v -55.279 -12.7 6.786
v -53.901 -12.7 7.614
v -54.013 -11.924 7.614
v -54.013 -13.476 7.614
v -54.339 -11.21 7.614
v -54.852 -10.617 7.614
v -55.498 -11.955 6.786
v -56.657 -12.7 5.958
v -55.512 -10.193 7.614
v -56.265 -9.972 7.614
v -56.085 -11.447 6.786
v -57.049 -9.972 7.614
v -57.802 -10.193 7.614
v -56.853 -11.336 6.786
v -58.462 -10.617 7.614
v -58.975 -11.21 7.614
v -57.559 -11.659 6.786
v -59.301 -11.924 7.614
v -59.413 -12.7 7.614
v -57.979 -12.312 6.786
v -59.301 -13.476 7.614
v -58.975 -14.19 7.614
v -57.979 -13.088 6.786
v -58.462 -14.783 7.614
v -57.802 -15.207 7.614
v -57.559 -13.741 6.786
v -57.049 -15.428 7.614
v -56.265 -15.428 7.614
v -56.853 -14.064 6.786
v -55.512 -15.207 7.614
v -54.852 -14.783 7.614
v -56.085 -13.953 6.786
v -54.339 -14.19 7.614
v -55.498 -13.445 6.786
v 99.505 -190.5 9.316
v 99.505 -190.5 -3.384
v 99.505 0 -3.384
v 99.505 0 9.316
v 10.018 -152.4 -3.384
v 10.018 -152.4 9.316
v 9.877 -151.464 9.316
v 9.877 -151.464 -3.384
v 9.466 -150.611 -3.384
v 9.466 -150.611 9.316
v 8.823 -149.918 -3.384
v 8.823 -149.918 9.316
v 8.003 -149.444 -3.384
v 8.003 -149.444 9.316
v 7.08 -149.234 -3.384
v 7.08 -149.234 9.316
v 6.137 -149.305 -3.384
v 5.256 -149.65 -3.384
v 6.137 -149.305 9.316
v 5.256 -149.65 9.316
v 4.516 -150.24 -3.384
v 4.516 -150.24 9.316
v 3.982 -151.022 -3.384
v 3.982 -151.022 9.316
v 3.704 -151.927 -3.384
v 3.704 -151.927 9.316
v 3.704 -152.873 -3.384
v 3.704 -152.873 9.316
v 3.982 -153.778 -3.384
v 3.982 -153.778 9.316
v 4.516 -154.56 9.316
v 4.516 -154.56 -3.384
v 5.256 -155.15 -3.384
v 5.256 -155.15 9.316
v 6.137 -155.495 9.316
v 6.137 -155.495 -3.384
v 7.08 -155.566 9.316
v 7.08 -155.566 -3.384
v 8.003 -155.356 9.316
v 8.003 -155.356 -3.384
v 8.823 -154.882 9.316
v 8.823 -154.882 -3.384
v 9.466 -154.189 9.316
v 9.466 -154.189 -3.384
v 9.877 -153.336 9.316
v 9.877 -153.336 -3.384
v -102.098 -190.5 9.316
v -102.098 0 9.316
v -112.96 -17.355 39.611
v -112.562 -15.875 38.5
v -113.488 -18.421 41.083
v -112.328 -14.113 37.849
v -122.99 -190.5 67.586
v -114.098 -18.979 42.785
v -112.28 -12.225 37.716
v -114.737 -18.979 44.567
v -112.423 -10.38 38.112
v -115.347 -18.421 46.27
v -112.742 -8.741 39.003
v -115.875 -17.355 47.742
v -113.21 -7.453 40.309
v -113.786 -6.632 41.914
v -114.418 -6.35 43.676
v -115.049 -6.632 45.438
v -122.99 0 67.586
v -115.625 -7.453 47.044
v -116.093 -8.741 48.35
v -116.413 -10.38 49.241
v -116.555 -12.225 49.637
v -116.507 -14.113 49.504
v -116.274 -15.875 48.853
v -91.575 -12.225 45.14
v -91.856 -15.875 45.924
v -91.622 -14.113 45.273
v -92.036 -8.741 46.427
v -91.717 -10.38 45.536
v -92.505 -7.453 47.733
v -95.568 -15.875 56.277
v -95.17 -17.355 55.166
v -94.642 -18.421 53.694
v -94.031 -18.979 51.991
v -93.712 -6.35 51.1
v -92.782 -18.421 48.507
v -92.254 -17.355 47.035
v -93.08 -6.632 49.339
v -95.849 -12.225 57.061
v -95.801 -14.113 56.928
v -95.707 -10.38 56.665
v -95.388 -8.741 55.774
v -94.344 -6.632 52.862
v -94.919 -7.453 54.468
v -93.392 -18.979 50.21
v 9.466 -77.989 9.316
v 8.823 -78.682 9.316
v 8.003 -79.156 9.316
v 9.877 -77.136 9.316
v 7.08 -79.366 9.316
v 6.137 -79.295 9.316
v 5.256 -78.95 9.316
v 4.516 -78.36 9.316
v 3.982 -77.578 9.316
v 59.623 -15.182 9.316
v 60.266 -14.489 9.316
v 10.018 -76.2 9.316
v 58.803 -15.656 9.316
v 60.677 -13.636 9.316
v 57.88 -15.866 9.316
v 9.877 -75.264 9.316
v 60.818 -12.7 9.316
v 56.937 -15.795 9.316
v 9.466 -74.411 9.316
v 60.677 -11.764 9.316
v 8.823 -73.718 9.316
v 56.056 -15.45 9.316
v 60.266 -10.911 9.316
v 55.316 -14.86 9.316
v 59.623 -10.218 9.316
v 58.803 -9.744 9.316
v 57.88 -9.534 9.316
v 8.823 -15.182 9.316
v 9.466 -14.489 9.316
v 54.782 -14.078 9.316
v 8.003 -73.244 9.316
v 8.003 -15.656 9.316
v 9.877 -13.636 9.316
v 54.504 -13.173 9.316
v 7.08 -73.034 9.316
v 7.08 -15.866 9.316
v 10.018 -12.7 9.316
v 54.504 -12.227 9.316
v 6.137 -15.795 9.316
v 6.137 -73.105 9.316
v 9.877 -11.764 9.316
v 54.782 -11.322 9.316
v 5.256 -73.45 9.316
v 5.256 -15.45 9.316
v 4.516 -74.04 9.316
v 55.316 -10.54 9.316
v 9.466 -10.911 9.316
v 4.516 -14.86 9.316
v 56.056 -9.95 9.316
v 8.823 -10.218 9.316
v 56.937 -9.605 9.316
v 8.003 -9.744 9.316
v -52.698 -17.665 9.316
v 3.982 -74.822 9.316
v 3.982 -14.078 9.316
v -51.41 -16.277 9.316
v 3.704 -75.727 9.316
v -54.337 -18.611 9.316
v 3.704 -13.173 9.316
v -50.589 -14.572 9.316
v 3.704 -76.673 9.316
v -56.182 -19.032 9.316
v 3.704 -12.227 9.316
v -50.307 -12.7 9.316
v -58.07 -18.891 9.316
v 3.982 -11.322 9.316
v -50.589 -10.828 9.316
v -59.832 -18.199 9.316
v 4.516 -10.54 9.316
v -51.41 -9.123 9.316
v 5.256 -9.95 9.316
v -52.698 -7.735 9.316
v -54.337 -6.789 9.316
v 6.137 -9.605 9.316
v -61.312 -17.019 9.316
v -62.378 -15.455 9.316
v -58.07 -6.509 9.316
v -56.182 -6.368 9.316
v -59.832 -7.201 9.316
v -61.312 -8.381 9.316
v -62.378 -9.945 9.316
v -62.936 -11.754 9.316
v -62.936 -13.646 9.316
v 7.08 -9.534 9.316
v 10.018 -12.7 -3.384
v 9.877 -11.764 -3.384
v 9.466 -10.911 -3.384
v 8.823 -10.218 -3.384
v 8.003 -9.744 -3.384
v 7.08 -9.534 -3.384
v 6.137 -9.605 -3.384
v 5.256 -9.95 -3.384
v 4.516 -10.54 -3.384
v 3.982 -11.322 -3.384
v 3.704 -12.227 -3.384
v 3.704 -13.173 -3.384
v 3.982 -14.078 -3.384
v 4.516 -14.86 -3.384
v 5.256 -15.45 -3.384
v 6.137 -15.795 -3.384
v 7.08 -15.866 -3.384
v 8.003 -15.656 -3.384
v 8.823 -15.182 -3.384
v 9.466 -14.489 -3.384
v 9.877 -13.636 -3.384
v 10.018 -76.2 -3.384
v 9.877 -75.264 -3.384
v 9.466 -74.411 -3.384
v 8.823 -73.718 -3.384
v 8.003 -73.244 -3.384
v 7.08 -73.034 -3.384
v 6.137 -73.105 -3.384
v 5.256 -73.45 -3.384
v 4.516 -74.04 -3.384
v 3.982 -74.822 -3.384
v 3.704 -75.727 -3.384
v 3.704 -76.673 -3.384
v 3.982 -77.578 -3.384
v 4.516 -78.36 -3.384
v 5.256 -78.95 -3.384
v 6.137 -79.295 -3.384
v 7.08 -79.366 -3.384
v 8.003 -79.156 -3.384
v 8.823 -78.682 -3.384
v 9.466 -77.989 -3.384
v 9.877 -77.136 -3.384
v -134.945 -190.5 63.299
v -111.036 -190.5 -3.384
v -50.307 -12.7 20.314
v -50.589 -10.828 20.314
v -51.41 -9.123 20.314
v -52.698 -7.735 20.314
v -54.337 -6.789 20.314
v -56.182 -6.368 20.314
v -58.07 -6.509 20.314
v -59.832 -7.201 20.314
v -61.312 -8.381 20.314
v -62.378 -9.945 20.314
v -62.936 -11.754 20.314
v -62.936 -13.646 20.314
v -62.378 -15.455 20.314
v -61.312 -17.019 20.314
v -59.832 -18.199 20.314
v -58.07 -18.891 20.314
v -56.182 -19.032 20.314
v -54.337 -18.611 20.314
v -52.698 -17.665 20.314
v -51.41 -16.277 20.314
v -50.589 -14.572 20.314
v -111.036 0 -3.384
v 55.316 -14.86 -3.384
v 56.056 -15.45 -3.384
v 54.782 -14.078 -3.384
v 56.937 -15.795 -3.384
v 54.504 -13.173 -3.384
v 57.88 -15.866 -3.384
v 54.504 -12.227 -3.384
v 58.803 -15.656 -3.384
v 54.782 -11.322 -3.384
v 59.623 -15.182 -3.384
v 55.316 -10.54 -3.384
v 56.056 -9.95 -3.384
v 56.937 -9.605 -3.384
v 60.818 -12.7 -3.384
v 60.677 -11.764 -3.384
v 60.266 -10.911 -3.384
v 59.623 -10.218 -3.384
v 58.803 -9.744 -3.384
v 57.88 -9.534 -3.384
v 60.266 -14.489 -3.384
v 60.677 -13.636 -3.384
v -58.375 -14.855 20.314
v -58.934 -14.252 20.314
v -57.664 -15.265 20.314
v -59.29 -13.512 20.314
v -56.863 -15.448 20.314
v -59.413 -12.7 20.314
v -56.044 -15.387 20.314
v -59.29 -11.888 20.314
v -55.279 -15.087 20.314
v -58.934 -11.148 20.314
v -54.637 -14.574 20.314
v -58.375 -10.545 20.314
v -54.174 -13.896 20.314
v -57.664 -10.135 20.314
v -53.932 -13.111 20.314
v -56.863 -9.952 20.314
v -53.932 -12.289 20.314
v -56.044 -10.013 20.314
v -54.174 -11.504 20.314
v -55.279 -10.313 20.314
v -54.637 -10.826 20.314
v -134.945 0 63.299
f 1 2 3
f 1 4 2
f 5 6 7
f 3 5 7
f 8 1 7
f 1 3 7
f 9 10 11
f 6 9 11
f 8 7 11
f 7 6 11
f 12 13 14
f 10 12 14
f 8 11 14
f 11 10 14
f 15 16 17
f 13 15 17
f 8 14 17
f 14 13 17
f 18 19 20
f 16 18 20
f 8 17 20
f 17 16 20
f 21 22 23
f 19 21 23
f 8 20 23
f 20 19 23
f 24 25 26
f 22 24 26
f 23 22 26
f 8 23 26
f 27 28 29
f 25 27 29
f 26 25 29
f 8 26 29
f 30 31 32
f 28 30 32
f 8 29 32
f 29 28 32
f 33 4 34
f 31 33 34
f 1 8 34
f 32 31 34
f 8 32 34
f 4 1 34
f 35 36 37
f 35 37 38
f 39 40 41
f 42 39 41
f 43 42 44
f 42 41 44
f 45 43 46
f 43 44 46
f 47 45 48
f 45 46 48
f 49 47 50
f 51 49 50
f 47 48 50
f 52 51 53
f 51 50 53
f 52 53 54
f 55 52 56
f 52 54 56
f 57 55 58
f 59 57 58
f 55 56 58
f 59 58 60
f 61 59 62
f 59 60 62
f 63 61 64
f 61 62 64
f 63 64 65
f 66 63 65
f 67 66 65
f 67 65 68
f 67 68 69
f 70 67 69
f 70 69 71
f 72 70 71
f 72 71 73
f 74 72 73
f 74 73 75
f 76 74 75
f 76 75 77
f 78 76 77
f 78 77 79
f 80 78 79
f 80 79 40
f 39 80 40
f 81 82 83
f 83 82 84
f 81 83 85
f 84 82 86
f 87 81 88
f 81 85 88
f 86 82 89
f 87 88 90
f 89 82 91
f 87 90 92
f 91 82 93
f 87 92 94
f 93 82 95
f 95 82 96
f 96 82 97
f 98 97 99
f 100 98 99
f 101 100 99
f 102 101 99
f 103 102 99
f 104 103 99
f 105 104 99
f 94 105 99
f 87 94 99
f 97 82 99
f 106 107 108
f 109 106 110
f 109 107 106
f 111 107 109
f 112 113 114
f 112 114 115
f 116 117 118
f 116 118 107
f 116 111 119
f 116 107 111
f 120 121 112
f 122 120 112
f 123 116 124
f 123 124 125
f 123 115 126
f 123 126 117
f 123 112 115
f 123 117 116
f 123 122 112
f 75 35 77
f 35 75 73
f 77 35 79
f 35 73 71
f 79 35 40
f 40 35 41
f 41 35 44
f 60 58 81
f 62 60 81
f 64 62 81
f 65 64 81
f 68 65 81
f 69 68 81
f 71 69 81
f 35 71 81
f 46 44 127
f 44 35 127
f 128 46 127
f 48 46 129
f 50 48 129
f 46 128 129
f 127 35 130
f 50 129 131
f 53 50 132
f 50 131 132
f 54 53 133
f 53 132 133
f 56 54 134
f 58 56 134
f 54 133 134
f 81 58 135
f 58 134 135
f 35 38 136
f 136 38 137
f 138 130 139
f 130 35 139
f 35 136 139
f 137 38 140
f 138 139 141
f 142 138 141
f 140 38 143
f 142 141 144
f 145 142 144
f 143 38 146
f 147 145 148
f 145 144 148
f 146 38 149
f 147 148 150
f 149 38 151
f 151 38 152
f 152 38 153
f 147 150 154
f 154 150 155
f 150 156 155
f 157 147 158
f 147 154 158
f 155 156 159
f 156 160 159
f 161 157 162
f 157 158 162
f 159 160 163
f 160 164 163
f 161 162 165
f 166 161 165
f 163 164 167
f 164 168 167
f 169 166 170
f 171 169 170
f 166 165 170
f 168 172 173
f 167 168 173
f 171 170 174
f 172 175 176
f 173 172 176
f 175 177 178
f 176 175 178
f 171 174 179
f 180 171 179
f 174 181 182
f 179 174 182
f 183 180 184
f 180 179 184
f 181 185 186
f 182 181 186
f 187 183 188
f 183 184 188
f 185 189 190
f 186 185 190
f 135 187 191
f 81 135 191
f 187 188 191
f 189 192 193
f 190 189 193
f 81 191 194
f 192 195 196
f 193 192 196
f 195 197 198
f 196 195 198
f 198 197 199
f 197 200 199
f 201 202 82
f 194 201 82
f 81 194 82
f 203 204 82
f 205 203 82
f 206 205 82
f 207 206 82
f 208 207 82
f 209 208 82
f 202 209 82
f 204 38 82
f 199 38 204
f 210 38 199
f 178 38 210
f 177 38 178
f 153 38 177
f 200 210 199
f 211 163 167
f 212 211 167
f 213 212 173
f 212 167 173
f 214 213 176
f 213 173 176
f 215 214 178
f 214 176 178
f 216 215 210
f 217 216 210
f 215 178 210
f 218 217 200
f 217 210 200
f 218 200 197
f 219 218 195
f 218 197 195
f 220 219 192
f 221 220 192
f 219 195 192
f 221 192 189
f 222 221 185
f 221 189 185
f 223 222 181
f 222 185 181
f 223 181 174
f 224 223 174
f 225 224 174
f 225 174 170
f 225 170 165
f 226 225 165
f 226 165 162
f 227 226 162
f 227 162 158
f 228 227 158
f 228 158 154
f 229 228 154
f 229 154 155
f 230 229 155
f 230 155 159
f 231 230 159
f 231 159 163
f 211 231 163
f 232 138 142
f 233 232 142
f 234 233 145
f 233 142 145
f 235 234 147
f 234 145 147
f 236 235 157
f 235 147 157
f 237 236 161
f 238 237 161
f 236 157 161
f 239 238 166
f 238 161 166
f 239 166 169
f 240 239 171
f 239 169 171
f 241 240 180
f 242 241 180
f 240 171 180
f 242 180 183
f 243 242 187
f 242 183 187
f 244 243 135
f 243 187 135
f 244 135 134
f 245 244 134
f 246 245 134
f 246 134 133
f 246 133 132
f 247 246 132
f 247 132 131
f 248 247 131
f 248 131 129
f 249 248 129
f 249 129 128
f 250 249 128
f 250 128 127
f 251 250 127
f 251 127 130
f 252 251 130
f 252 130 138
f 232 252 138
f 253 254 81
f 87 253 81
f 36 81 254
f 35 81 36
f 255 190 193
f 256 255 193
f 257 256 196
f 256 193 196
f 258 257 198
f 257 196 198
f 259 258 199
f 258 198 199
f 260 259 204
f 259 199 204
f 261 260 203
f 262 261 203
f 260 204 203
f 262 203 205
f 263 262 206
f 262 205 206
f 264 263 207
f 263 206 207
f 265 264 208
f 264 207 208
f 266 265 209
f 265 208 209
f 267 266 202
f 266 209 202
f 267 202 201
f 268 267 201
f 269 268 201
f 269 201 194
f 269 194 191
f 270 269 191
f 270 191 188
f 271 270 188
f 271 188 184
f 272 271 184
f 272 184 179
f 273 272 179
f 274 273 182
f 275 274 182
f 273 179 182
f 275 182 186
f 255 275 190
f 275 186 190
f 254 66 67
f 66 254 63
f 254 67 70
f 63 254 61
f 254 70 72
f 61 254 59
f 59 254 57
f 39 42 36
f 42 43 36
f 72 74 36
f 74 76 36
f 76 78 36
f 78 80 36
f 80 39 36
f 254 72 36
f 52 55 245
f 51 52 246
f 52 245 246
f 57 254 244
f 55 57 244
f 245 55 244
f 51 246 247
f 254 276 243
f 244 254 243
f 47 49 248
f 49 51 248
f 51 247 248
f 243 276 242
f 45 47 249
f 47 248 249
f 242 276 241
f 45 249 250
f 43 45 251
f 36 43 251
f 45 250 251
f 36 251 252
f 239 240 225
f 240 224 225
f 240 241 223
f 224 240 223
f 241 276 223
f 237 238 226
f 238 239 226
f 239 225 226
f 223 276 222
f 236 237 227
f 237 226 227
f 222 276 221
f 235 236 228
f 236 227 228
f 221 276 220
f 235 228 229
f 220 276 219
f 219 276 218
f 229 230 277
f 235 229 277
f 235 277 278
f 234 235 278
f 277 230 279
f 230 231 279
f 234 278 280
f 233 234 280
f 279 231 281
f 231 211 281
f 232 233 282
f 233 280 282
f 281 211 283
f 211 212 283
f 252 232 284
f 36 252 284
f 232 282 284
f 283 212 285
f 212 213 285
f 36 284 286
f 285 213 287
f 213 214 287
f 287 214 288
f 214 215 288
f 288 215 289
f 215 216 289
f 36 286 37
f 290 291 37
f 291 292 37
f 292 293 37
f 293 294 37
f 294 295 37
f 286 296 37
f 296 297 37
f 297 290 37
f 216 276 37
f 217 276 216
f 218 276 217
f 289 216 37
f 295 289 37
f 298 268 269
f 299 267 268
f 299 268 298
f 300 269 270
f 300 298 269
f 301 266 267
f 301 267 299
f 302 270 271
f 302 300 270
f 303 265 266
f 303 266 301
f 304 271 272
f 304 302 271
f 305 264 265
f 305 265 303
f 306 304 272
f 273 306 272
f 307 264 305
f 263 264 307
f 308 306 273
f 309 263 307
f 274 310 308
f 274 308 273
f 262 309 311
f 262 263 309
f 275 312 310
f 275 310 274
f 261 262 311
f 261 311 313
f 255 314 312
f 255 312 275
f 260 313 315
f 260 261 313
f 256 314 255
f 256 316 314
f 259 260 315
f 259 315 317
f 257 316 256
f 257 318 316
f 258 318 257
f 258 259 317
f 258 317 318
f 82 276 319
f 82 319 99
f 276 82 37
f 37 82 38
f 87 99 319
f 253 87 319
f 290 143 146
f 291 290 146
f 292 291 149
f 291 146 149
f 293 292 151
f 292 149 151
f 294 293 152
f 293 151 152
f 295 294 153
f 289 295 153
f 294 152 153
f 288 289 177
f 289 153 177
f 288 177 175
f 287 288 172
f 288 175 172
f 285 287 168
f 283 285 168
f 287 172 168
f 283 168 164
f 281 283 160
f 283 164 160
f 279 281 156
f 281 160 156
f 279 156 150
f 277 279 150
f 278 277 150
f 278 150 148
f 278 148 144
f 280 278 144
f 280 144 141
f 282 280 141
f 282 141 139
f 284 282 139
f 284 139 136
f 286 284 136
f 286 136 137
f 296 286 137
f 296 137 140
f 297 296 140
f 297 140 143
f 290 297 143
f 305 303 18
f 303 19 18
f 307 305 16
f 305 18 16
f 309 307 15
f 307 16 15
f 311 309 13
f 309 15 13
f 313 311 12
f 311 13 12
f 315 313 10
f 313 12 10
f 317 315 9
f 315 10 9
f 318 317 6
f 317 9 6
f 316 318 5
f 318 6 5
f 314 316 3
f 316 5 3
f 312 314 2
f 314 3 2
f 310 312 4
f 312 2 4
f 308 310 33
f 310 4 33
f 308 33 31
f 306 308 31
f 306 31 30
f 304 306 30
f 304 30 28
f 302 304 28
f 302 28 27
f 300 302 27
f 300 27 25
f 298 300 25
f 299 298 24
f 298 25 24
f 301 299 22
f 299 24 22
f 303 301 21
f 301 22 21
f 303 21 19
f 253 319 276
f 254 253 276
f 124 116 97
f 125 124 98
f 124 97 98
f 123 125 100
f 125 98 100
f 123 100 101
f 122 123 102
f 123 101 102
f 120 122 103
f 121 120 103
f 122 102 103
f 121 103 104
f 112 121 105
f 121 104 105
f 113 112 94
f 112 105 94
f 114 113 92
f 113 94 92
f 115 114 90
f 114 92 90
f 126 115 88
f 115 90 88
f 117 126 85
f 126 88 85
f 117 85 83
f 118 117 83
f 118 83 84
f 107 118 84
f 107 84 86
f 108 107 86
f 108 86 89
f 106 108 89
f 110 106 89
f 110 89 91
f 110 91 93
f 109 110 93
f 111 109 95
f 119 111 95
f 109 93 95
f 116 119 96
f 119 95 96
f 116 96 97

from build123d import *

# Parameters (mm, degrees)
F1_DEPTH = 190.5
F2_R     = 3.175
F3_DEPTH = 12.701
F4_R     = 6.35
F5_DEPTH = 10.9982
F6_R     = 6.35
F7_DEPTH = 21.9964
F9_D     = 5.5118
F9_DEPTH = 12.7
F9_TIP   = 1.65591178


with BuildPart() as f1:
    # F0 (on Front) → F1 (new body)
    with BuildSketch(Plane.XZ):
        Polygon((-134.9451830515, 63.2994985103), (-111.0356246655, -3.3842598282), (99.5049753345, -3.3842598282), (99.5049753345, 9.3157401718), (-102.0975527369, 9.3157401718), (-122.9904038585, 67.5859019499), align=None)
    extrude(amount=F1_DEPTH)

    # F2 (on face) → F3 (cut, through all)
    with BuildSketch(Plane.XY.offset(9.3157401718)):
        with Locations((6.8430472631, -152.4)):
            Circle(F2_R)
        with Locations((6.8430472631, -76.2)):
            Circle(F2_R)
        with Locations((6.8430472631, -12.7)):
            Circle(F2_R)
        with Locations((57.6430472631, -12.7)):
            Circle(F2_R)
    extrude(amount=-F3_DEPTH, mode=Mode.SUBTRACT)

    # F4 (on face) → F5 (join)
    with BuildSketch(Plane.XY.offset(9.3157401718)):
        with Locations((-56.6569527369, -12.7)):
            Circle(F4_R)
    extrude(amount=F5_DEPTH)

    # F6 (on face) → F7 (join)
    with BuildSketch(Plane(origin=(-87.5074922841, 0, -31.375938431), x_dir=(0, 1, 0), z_dir=(0.9413211963, 0, 0.3375120819))):
        with Locations((-12.7, 79.7307893311)):
            Circle(F6_R)
    extrude(amount=F7_DEPTH)

    # F9
    with Locations(Plane.XY.offset(20.3139401718)):
        with Locations((-56.6569527369, -12.7)):
            Hole(F9_D / 2, depth=F9_DEPTH)
            with Locations((0, 0, -(F9_DEPTH + F9_TIP / 2))):  # 118° drill point
                Cone(0, F9_D / 2, F9_TIP, mode=Mode.SUBTRACT)


solid = f1.part
